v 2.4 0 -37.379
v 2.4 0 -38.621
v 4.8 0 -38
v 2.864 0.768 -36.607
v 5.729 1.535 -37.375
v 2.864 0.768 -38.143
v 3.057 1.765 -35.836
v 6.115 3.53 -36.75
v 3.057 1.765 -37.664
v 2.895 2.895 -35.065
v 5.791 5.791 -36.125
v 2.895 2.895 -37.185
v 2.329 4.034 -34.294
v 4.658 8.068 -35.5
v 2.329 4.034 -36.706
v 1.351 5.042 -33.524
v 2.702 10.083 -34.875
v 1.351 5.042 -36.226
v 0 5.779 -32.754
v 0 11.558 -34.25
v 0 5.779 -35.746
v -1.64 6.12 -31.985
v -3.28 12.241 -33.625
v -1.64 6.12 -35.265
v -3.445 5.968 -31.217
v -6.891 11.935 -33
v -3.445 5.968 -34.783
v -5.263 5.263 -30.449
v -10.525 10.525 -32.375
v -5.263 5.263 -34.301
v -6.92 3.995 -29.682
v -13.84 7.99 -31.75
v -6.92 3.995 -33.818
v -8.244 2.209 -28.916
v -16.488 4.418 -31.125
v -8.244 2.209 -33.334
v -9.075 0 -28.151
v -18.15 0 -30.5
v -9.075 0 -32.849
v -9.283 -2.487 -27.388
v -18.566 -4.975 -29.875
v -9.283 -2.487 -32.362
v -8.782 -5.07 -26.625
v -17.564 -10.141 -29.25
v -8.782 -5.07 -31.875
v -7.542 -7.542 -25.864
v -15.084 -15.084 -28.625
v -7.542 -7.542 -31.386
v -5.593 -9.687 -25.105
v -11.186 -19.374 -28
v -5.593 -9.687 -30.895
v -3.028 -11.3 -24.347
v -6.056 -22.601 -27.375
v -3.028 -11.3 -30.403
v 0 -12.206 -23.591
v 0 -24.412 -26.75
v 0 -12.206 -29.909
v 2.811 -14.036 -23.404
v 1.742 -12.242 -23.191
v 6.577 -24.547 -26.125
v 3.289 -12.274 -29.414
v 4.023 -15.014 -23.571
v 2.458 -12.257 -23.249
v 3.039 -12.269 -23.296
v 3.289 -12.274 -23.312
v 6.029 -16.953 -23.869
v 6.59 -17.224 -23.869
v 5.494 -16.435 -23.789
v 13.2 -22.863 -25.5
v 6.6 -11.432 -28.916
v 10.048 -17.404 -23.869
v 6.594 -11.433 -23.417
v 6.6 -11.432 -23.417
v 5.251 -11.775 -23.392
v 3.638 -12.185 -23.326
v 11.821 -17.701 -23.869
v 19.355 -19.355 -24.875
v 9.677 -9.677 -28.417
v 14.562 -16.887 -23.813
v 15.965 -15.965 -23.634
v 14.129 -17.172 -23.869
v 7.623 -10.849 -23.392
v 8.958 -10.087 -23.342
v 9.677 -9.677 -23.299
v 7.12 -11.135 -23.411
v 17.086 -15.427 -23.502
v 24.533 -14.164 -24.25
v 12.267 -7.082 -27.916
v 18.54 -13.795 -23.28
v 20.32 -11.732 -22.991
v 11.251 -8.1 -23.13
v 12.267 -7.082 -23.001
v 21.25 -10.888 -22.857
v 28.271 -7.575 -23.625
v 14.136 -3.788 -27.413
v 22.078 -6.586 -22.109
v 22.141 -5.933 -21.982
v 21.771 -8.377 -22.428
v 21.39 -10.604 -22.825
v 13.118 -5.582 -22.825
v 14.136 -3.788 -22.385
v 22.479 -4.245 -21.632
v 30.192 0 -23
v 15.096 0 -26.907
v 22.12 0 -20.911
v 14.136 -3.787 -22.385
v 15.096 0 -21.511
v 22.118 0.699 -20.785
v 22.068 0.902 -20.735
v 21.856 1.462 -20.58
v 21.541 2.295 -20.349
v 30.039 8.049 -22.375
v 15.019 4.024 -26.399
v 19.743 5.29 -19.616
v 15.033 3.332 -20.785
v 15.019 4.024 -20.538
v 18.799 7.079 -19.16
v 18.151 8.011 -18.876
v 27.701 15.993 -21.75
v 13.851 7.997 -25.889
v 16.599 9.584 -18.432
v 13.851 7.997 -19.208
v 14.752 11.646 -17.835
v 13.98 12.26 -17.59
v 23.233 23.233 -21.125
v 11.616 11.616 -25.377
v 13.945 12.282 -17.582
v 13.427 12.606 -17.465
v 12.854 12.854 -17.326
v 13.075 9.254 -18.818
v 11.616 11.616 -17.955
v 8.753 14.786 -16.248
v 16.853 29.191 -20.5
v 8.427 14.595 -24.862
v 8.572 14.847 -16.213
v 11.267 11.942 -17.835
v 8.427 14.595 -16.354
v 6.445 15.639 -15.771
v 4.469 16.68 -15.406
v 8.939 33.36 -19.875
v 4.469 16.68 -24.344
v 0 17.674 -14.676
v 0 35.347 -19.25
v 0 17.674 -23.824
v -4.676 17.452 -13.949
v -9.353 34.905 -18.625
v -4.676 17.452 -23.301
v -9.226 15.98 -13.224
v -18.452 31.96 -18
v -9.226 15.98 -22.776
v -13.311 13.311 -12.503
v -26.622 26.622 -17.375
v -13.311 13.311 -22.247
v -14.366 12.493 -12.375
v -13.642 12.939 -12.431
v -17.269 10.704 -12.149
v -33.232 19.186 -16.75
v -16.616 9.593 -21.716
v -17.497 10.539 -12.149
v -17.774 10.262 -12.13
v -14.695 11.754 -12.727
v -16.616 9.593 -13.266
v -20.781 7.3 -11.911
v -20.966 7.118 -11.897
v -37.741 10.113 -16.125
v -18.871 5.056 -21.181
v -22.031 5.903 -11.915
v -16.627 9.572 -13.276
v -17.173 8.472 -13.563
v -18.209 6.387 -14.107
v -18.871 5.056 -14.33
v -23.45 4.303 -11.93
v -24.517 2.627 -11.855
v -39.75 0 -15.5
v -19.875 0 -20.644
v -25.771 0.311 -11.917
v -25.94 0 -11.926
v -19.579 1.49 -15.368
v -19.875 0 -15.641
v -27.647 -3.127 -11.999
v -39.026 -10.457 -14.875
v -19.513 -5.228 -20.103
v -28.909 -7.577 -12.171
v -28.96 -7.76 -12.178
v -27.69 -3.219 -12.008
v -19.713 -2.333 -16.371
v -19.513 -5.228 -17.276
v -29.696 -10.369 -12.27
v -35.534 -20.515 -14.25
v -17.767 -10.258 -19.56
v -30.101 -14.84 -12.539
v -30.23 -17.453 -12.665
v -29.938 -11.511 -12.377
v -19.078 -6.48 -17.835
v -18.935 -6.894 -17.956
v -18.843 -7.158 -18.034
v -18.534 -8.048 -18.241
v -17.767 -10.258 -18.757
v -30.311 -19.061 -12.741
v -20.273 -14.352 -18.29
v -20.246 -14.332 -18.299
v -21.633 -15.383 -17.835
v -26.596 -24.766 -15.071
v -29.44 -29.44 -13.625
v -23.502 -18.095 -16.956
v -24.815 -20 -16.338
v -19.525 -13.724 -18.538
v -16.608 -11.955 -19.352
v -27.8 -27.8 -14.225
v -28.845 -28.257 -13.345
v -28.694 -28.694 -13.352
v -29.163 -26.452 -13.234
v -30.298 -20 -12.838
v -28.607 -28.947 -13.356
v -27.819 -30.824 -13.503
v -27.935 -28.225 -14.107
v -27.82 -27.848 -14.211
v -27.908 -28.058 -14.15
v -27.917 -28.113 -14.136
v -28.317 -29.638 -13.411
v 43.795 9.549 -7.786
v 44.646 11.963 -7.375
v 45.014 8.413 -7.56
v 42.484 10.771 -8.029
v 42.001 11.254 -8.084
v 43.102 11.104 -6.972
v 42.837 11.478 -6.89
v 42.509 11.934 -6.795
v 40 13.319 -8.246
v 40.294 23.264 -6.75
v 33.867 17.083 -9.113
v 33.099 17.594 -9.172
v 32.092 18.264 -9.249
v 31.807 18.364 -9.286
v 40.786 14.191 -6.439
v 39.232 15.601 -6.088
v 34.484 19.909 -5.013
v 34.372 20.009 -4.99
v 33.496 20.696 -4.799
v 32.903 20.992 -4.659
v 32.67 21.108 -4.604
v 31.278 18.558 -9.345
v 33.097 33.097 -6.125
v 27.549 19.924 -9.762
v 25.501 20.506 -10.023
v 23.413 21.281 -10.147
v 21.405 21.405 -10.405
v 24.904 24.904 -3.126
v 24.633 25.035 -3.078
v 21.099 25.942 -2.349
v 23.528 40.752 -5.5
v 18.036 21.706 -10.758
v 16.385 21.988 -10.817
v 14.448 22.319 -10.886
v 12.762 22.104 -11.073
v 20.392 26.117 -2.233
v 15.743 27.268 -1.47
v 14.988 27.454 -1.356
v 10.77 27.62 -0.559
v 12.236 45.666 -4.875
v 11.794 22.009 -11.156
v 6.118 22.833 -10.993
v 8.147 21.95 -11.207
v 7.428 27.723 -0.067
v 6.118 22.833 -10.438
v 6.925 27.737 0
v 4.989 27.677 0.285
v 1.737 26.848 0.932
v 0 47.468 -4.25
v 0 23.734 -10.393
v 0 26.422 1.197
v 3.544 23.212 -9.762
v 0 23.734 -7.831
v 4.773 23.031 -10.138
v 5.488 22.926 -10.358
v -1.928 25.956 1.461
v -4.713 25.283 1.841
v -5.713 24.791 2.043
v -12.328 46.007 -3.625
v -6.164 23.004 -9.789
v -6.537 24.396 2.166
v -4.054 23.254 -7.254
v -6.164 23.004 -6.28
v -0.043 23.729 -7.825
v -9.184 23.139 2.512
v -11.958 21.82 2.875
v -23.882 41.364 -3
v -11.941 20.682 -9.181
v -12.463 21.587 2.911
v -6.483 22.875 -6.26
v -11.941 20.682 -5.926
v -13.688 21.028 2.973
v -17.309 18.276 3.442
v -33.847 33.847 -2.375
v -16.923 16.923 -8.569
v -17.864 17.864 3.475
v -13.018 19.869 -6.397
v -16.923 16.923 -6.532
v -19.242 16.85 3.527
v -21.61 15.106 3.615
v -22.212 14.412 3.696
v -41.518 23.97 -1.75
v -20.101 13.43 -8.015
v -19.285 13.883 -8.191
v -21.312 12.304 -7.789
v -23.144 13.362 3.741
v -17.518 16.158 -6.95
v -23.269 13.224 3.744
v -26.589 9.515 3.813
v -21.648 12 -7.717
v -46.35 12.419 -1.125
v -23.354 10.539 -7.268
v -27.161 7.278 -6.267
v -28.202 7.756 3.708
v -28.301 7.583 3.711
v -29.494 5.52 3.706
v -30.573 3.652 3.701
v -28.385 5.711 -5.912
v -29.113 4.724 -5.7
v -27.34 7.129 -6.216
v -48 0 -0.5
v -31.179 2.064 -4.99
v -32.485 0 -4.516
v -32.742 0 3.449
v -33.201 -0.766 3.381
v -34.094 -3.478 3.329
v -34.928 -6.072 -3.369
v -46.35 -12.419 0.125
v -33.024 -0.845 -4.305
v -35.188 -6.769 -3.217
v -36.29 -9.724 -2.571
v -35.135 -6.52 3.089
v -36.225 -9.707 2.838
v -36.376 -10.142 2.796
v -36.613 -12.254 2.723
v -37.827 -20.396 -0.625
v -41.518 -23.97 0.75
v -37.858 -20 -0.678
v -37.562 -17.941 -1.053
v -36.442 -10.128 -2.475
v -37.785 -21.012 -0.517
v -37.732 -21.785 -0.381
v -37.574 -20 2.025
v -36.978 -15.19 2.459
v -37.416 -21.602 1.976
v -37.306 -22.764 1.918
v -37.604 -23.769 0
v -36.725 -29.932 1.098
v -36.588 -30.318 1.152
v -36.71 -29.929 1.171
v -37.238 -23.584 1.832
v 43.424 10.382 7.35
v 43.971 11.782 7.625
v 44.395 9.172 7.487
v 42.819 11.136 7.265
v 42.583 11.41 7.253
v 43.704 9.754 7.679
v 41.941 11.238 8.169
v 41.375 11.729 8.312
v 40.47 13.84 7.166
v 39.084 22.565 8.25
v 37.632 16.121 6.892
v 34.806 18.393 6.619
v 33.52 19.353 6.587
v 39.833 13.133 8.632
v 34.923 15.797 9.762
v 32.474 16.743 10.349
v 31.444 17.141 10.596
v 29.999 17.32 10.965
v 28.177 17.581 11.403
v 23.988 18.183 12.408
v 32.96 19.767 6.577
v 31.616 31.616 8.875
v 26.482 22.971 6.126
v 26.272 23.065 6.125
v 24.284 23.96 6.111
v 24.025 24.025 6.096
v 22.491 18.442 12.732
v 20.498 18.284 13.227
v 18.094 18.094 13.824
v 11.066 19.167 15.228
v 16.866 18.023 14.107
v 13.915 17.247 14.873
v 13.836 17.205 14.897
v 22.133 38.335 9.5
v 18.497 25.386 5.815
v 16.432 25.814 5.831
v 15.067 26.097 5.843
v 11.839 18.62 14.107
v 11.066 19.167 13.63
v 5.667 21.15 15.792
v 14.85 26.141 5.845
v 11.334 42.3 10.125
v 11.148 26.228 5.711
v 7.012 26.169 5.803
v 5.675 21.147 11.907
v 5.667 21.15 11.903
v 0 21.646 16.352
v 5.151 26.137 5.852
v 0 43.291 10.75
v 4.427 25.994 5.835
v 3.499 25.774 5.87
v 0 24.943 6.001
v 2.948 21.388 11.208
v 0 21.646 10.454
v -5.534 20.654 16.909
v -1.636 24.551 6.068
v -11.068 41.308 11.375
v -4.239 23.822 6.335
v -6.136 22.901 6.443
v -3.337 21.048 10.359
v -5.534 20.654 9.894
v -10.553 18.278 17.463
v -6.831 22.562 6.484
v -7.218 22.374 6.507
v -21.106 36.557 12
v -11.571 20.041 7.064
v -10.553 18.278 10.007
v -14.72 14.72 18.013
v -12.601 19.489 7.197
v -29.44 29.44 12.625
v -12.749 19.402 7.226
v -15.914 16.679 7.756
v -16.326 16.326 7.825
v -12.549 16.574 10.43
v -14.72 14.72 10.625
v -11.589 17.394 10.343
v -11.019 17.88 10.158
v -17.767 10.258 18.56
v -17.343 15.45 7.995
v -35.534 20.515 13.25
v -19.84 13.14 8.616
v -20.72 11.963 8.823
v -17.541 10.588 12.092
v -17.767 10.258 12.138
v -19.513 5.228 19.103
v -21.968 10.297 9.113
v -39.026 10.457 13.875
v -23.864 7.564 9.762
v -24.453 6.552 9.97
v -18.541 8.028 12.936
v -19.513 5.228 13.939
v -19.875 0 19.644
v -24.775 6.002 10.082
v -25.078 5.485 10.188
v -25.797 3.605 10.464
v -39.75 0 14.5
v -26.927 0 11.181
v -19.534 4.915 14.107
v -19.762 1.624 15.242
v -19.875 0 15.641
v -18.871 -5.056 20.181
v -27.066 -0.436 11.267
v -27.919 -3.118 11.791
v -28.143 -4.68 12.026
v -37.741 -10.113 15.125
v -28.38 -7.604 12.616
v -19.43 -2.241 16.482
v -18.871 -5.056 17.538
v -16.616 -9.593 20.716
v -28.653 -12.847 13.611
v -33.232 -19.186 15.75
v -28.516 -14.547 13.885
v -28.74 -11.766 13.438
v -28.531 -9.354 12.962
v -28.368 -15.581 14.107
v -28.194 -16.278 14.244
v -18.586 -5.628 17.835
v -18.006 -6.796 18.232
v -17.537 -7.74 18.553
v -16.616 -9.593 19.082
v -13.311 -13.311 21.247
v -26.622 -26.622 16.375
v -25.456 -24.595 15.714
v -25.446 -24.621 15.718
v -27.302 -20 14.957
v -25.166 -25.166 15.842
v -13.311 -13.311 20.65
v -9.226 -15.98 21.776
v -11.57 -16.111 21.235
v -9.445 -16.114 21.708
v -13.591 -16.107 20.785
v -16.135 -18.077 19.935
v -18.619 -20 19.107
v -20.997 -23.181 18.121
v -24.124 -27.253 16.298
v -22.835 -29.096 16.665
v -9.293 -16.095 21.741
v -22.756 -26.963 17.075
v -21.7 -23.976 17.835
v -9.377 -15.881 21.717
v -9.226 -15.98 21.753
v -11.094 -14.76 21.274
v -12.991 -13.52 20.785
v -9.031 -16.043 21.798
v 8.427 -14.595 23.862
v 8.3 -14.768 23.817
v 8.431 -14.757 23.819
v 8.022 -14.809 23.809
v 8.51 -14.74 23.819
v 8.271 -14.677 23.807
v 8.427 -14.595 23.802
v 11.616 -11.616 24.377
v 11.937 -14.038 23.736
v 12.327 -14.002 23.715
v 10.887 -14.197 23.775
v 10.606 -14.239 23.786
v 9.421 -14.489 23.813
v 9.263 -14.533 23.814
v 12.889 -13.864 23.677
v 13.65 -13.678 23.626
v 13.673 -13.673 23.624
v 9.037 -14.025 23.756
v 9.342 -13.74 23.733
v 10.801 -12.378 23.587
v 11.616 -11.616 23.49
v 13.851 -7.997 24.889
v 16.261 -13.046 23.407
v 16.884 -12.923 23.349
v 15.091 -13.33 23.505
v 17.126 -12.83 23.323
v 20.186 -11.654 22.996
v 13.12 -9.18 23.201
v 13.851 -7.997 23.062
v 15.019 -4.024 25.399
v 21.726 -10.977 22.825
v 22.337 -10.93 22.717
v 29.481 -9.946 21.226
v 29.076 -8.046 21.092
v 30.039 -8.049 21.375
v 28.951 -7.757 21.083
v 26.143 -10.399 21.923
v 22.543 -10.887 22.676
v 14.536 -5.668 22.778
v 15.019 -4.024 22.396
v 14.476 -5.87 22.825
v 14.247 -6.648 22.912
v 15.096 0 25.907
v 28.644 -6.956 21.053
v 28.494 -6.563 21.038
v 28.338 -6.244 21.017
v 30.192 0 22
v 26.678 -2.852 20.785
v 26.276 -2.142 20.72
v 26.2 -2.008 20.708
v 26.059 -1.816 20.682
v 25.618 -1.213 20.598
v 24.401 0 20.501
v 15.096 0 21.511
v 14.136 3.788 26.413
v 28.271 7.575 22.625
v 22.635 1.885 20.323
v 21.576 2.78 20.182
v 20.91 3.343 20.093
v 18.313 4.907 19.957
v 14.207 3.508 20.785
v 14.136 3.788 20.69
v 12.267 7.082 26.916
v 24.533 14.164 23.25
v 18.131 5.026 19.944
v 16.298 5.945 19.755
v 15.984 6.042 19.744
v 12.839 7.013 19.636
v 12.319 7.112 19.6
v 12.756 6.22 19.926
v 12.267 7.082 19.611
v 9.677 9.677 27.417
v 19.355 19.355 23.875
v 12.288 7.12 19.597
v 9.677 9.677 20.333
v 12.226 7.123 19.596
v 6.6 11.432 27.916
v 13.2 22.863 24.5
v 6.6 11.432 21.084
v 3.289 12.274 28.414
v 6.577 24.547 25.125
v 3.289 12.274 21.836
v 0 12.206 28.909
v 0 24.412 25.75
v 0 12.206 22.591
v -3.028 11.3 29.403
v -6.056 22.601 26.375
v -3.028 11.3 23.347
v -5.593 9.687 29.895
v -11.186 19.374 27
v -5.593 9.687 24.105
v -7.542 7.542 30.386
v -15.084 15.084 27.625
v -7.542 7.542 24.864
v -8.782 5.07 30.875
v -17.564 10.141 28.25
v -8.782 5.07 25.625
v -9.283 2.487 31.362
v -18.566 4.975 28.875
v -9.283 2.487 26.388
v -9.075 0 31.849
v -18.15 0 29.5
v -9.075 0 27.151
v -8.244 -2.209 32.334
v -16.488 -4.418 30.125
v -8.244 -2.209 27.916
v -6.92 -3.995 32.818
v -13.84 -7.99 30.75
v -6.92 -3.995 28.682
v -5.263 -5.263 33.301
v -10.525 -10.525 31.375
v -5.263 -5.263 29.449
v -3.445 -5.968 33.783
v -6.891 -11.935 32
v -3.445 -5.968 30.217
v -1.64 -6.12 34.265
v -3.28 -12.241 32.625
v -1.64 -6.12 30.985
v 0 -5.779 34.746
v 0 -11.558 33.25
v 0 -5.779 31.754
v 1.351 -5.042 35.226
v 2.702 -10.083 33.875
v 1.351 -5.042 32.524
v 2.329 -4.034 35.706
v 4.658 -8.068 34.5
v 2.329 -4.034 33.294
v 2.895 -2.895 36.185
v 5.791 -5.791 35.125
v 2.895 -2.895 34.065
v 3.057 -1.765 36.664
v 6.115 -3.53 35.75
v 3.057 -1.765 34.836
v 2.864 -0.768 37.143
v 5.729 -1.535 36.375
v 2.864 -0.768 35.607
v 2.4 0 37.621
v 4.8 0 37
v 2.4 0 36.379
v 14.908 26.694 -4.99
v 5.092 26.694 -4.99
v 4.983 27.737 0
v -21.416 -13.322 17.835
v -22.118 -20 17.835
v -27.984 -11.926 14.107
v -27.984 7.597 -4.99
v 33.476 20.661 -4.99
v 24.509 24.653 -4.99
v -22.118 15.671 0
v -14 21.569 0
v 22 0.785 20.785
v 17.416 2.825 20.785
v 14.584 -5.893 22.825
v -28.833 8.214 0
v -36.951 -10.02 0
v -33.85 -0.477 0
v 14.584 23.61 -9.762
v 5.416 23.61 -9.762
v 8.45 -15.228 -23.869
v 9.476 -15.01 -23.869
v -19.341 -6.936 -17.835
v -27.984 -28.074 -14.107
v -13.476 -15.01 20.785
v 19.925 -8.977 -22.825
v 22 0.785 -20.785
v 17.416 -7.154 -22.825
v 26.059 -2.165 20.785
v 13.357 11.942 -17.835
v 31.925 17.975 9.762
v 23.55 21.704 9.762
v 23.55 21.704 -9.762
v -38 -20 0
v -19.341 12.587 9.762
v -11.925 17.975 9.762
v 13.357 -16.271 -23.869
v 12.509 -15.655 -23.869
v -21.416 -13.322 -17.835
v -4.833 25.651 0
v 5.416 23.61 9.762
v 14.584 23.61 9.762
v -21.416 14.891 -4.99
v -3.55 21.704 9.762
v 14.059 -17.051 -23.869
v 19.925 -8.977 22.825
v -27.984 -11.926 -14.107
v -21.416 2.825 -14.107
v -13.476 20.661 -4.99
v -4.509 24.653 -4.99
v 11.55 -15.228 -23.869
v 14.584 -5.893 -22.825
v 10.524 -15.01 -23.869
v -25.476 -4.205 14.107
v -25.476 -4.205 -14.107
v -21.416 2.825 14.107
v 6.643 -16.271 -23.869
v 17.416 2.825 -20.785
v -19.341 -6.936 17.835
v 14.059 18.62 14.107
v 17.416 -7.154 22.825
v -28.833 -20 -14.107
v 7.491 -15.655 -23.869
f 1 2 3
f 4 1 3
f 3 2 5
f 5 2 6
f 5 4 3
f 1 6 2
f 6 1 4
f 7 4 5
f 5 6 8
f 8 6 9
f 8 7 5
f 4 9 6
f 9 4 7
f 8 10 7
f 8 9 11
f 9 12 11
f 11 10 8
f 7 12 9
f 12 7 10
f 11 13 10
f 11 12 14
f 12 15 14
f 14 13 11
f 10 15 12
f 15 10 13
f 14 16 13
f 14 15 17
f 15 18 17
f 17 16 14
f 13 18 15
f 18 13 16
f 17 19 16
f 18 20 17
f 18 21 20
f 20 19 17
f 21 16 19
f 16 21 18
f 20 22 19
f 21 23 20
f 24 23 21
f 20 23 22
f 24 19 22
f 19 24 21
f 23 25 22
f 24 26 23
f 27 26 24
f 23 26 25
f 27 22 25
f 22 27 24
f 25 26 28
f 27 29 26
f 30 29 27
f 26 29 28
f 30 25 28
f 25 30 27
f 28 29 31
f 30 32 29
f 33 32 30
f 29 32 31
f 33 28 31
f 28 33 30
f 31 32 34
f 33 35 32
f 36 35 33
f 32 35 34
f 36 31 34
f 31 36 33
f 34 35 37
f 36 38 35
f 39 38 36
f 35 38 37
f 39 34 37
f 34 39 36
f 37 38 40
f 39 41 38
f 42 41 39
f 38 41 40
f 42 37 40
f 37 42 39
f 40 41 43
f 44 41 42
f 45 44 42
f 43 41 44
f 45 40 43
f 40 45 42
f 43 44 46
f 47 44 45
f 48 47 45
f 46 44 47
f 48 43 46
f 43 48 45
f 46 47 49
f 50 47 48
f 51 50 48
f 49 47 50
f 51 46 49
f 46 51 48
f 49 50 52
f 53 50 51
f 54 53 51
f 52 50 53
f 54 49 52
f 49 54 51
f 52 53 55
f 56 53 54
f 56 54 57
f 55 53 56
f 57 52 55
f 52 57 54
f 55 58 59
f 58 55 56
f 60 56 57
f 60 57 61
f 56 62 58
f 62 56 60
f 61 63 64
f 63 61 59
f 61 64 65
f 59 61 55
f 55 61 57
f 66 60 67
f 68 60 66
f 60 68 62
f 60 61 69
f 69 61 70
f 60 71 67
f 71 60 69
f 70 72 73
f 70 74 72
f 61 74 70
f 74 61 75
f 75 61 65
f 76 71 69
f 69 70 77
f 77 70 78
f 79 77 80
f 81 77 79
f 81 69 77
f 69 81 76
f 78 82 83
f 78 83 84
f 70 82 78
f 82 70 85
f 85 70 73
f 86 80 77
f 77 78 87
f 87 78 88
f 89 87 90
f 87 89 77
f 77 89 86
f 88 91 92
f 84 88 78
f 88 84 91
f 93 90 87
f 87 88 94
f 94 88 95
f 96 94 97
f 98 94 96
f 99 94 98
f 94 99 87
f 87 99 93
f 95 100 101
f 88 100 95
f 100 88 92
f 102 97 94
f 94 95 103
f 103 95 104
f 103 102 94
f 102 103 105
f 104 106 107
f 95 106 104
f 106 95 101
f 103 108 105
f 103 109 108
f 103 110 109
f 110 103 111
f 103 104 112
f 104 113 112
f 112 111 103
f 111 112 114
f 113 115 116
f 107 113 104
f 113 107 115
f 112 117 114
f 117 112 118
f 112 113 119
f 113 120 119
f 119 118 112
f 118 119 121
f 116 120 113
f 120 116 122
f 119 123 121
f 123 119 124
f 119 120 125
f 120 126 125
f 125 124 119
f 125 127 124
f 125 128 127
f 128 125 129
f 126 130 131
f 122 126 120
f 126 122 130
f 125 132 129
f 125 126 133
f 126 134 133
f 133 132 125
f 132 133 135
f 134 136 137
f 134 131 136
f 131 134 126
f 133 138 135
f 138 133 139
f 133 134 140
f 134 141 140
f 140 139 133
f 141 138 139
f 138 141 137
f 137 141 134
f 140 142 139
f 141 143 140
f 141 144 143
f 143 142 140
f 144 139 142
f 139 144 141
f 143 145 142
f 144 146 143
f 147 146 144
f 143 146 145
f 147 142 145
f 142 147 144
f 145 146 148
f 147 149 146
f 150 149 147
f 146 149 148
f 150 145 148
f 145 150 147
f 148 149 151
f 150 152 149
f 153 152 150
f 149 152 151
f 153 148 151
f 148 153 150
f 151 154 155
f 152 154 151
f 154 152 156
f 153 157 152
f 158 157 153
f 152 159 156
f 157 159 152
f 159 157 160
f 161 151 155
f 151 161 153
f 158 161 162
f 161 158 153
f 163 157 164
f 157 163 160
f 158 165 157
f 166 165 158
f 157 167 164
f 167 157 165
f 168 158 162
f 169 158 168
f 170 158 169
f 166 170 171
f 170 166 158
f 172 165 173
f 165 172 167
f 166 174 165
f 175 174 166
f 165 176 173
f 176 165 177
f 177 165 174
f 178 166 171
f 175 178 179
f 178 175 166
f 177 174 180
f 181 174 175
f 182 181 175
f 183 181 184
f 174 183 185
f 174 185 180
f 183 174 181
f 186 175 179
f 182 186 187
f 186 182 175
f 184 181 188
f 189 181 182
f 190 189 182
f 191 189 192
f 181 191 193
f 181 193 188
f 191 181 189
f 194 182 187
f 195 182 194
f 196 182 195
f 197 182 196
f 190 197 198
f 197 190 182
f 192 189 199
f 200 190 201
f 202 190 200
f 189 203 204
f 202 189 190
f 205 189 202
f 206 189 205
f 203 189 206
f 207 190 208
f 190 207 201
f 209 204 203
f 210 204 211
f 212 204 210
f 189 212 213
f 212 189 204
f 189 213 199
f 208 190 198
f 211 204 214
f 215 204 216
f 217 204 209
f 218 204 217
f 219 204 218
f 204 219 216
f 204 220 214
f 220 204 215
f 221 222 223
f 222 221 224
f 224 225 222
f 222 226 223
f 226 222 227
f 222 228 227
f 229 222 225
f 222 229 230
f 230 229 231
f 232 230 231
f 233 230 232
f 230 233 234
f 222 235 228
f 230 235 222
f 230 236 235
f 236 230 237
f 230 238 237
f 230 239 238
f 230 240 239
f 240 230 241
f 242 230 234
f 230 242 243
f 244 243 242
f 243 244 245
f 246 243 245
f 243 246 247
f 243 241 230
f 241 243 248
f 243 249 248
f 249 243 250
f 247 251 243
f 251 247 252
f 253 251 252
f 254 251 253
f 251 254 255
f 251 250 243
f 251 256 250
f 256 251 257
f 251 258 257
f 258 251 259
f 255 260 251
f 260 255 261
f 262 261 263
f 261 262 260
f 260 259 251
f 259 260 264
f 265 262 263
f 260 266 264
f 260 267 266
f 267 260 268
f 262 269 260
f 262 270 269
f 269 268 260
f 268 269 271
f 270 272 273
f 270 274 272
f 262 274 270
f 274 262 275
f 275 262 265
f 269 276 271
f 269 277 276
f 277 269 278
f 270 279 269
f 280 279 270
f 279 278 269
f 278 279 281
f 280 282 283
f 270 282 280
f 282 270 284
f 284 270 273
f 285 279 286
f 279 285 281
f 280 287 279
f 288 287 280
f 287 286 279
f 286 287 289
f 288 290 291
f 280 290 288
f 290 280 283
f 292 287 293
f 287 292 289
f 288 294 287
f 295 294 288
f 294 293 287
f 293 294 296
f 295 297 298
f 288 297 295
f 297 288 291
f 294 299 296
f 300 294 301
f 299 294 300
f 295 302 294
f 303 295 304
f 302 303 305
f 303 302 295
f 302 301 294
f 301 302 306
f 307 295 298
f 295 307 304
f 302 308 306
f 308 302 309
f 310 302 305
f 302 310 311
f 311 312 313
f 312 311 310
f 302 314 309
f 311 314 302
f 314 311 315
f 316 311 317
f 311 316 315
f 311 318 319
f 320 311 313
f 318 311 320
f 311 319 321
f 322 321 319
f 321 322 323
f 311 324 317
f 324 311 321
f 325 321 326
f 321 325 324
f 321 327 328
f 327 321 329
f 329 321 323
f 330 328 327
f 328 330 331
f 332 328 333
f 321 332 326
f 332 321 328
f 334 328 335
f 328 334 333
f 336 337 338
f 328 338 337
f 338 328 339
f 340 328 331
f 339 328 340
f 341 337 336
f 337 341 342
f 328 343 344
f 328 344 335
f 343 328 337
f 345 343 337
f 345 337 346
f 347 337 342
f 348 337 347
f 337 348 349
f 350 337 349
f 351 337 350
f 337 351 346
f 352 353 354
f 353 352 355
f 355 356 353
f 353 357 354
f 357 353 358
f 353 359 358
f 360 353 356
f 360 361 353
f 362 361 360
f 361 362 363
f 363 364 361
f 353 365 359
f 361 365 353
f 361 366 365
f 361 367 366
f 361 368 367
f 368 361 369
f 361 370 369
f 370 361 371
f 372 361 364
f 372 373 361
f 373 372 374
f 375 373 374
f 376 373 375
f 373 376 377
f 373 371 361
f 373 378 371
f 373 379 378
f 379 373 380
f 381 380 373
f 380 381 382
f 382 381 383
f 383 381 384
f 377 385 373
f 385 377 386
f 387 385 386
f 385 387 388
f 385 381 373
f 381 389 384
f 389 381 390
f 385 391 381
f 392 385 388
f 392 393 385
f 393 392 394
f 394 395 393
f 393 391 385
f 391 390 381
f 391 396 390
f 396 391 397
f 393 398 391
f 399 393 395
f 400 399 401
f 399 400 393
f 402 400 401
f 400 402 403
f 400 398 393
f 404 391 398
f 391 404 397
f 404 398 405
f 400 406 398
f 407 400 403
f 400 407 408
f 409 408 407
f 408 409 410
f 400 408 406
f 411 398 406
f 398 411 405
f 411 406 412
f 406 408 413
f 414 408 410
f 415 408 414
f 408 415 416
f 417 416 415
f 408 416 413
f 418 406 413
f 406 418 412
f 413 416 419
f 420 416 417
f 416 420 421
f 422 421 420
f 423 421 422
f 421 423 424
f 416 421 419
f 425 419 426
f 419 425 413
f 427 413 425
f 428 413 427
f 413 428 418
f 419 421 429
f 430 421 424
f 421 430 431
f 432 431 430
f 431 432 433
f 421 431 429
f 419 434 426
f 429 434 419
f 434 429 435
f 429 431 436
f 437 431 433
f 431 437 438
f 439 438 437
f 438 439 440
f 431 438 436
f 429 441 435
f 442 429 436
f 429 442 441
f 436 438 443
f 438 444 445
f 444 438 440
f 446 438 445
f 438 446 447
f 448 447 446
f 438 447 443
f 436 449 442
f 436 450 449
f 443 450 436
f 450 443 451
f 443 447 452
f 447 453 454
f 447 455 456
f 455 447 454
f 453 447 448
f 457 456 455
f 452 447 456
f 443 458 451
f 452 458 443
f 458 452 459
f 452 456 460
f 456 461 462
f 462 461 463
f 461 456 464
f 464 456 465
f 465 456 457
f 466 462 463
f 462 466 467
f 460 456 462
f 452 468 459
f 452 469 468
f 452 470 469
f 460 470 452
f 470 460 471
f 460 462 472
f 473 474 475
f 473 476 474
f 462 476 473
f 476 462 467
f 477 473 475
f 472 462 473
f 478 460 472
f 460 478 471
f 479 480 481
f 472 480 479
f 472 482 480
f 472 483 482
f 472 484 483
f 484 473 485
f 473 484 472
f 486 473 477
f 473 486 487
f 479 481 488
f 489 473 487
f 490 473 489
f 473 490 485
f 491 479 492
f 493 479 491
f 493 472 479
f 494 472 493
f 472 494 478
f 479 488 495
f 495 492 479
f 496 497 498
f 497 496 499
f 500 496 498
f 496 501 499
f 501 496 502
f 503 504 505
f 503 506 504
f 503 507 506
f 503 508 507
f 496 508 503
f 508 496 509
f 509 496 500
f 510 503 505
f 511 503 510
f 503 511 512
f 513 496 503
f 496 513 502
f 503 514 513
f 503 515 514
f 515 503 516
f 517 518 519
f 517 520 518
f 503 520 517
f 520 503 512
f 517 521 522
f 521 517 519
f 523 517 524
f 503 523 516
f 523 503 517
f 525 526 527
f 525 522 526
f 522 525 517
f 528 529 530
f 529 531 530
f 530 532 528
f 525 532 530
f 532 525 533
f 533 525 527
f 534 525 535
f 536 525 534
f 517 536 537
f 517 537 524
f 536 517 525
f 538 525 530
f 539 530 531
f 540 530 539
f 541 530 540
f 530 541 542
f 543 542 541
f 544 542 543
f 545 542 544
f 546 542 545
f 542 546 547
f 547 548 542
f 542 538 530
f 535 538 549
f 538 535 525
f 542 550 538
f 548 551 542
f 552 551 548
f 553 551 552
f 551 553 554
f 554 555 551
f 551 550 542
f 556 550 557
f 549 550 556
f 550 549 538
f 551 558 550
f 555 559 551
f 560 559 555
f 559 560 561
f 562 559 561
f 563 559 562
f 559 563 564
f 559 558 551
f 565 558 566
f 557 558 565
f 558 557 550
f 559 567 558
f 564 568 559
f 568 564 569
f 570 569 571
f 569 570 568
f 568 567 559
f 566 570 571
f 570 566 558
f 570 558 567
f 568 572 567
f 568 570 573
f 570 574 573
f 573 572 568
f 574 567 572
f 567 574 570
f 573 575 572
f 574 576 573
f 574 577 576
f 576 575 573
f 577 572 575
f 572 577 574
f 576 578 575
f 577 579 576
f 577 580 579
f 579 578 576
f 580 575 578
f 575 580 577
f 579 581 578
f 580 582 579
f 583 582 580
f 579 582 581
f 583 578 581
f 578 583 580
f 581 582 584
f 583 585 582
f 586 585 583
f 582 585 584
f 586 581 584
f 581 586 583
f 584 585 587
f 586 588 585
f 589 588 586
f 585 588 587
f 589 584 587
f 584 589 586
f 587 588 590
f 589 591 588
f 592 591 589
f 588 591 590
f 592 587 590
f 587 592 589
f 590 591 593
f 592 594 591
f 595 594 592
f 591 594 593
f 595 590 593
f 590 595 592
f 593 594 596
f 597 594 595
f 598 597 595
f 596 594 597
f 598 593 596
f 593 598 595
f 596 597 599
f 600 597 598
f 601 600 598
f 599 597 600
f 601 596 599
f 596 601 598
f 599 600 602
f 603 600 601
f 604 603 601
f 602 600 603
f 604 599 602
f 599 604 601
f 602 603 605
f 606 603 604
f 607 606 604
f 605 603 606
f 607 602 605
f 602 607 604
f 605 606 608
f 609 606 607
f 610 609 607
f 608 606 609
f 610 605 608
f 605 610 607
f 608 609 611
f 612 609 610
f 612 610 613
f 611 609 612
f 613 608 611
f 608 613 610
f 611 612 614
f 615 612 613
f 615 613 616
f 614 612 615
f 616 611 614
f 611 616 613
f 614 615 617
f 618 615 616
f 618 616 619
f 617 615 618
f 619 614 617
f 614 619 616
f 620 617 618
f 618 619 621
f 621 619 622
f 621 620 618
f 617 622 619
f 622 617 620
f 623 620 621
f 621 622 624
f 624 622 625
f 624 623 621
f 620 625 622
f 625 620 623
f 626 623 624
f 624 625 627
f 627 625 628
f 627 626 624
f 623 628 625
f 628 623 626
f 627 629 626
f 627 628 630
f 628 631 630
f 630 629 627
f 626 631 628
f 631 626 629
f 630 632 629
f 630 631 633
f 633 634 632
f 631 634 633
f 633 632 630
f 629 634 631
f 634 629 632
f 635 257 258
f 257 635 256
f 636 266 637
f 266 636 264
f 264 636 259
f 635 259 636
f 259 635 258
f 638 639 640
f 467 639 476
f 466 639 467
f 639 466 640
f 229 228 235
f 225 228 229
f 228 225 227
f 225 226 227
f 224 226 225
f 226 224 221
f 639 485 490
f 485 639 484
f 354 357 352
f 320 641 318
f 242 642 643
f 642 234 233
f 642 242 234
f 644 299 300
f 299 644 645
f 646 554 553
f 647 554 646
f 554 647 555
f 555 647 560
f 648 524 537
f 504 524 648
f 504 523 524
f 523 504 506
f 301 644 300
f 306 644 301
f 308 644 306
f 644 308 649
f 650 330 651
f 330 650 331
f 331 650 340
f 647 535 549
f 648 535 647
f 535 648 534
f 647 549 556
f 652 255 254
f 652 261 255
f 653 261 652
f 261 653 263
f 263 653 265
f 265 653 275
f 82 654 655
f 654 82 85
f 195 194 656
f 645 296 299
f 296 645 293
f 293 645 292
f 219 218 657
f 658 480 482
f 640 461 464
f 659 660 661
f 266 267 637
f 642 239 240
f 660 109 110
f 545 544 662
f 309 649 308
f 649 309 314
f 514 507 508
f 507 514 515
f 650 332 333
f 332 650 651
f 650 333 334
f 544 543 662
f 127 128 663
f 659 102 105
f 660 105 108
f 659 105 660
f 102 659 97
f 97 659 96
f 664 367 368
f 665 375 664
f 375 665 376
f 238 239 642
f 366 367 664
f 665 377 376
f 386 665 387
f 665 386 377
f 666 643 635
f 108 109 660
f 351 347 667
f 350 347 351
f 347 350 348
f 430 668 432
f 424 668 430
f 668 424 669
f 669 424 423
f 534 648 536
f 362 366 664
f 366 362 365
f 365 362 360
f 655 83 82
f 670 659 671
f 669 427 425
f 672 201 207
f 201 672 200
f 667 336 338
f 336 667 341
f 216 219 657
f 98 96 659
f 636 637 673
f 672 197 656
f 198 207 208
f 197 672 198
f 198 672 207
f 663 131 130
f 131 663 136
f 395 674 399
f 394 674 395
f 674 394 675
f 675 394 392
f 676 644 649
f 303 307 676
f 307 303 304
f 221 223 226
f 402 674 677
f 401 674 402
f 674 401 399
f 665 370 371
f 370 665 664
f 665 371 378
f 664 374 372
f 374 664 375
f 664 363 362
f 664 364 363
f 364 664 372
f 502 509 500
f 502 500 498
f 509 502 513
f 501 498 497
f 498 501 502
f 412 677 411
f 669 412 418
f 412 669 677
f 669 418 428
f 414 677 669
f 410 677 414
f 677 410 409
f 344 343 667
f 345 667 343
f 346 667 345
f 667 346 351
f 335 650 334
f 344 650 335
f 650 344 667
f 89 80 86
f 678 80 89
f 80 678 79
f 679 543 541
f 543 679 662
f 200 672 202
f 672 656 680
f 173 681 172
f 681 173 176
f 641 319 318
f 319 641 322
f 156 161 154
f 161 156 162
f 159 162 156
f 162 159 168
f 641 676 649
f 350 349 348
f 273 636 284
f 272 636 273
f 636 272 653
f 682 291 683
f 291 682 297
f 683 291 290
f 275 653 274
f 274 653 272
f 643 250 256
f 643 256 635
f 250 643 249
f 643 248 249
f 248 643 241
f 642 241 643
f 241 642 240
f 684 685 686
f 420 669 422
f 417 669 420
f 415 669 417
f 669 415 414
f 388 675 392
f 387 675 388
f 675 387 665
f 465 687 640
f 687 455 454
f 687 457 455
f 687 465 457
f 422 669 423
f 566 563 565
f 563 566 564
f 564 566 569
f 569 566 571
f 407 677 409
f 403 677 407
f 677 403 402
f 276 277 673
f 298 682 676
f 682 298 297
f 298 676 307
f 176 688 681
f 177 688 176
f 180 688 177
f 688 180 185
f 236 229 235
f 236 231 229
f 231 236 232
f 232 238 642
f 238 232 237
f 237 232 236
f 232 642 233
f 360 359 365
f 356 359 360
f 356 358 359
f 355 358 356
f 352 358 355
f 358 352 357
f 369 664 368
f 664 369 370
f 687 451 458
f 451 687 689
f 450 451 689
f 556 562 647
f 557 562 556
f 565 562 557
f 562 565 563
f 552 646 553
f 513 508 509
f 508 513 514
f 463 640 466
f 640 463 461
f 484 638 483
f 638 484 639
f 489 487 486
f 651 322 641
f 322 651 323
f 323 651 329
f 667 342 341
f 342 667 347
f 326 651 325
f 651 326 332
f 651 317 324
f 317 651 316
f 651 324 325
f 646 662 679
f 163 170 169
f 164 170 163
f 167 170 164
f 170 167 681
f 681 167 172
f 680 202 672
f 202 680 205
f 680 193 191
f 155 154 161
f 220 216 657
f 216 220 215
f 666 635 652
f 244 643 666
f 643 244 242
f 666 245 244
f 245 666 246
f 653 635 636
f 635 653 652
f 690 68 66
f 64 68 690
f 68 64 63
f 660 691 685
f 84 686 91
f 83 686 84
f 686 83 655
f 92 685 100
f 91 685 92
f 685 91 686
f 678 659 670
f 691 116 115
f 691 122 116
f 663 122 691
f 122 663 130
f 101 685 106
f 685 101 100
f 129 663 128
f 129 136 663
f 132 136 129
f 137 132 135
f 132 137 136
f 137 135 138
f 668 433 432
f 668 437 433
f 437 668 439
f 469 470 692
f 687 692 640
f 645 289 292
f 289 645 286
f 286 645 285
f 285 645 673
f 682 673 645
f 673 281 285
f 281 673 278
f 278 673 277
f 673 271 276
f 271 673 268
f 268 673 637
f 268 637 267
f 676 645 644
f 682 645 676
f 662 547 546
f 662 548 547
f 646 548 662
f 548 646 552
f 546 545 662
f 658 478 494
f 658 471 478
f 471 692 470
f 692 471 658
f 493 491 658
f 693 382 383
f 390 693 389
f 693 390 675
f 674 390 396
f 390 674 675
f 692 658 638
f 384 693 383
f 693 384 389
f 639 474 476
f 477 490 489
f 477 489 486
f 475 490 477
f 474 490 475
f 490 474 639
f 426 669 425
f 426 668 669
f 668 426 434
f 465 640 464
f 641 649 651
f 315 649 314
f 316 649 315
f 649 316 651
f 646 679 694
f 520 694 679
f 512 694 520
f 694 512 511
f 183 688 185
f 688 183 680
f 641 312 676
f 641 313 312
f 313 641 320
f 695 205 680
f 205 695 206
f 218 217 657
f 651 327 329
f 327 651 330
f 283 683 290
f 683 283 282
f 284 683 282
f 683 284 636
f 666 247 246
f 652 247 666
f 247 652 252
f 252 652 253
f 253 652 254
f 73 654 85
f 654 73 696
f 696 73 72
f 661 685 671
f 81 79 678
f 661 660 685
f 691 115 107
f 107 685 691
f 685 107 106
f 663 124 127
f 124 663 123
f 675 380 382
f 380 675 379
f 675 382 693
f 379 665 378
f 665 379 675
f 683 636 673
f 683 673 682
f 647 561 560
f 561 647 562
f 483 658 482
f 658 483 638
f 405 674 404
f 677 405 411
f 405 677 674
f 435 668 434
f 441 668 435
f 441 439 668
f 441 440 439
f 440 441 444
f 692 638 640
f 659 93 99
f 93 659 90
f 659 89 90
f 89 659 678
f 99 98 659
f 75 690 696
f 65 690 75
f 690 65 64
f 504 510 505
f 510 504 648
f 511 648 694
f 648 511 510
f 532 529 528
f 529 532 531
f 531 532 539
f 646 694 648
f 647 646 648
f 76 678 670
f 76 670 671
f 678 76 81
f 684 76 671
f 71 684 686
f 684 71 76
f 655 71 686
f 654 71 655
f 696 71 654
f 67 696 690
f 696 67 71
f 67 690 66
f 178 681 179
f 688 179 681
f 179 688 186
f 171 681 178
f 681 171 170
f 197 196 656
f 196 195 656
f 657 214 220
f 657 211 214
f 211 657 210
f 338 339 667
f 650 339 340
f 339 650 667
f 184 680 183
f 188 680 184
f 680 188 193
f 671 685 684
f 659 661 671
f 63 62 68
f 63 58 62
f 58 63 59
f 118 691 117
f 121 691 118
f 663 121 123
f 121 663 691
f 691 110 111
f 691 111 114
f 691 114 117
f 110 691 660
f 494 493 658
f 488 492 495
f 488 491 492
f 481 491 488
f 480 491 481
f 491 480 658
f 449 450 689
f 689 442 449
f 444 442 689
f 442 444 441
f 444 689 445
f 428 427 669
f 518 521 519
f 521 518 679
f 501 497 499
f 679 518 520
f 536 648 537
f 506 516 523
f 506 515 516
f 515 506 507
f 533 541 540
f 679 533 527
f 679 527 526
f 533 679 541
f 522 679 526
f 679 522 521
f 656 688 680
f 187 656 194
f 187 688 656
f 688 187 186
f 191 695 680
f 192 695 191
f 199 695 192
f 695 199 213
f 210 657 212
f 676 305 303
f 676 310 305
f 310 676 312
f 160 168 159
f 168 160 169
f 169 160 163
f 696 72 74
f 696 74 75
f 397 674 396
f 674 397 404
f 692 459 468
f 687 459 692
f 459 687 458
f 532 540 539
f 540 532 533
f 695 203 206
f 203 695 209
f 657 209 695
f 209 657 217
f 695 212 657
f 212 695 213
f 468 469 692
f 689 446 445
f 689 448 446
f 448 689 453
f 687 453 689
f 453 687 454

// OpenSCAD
scale=1;

numberTurns=5;

steps=24*numberTurns;

module slice(Xa, Ya, Za, Xb, Yb, Zb, radiusa, radiusb)
{	
	angleZ=atan2(Ya, Xa);
	twistZ=atan2(Yb, Xb)-atan2(Ya, Xa);

	polyPoints=[
		[Xa+ radiusa*cos(+angleZ),		Ya+ radiusa*sin(+angleZ),		Za ],
		[Xa ,						Ya ,						Za+ radiusa*sin(15) ],
		[Xa ,						Ya ,						Za+ radiusa*sin(-15) ],
	
		[Xb+ radiusb*cos(angleZ+twistZ),	Yb+ radiusb*sin(angleZ+twistZ),	Zb ],
		[Xb ,						Yb ,						Zb+ radiusb*sin(15) ],
		[Xb ,						Yb ,						Zb+ radiusb*sin(-15)] ];
	
	polyTriangles=[
		[ 0, 2, 1 ],
	
		[ 3, 2, 0], [ 2, 3, 5],
	
		[ 4, 0, 1], [ 0, 4, 3],
	
		[ 5, 1, 2], [ 1, 5, 4],
	
		[ 3, 4, 5 ]
		 ];
	
	//color([(radiusa)/24/scale,(radiusa)/24/scale,(radiusa)/24/scale])
	polyhedron( polyPoints, polyTriangles );
}

function 	size(i)=	24*scale*(0.1+0.9*sin(i*180));

function 	X(i)=		scale*(size(i))*cos(i*360*numberTurns);
function 	Y(i)=		scale*(size(i))*sin(i*360*numberTurns);
function 	Z(i)=		scale*15*numberTurns*i;

module corkscrew()
{
	for (i=[0:steps-1])
	{
		slice(
			Xa=		X(i/steps),
			Ya=		Y(i/steps),
			Za=		Z(i/steps),
			Xb=		X((i+1)/steps),
			Yb=		Y((i+1)/steps), 
			Zb=		Z((i+1)/steps), 
			radiusa=	size(i/steps), 
			radiusb=	size((i+1)/steps)
			);
	}
}

difference()
{
	translate([0,0,-38])
	corkscrew();

	translate([10,-20,0])
	scale([1,1,0.5])
	sphere(48);
}
